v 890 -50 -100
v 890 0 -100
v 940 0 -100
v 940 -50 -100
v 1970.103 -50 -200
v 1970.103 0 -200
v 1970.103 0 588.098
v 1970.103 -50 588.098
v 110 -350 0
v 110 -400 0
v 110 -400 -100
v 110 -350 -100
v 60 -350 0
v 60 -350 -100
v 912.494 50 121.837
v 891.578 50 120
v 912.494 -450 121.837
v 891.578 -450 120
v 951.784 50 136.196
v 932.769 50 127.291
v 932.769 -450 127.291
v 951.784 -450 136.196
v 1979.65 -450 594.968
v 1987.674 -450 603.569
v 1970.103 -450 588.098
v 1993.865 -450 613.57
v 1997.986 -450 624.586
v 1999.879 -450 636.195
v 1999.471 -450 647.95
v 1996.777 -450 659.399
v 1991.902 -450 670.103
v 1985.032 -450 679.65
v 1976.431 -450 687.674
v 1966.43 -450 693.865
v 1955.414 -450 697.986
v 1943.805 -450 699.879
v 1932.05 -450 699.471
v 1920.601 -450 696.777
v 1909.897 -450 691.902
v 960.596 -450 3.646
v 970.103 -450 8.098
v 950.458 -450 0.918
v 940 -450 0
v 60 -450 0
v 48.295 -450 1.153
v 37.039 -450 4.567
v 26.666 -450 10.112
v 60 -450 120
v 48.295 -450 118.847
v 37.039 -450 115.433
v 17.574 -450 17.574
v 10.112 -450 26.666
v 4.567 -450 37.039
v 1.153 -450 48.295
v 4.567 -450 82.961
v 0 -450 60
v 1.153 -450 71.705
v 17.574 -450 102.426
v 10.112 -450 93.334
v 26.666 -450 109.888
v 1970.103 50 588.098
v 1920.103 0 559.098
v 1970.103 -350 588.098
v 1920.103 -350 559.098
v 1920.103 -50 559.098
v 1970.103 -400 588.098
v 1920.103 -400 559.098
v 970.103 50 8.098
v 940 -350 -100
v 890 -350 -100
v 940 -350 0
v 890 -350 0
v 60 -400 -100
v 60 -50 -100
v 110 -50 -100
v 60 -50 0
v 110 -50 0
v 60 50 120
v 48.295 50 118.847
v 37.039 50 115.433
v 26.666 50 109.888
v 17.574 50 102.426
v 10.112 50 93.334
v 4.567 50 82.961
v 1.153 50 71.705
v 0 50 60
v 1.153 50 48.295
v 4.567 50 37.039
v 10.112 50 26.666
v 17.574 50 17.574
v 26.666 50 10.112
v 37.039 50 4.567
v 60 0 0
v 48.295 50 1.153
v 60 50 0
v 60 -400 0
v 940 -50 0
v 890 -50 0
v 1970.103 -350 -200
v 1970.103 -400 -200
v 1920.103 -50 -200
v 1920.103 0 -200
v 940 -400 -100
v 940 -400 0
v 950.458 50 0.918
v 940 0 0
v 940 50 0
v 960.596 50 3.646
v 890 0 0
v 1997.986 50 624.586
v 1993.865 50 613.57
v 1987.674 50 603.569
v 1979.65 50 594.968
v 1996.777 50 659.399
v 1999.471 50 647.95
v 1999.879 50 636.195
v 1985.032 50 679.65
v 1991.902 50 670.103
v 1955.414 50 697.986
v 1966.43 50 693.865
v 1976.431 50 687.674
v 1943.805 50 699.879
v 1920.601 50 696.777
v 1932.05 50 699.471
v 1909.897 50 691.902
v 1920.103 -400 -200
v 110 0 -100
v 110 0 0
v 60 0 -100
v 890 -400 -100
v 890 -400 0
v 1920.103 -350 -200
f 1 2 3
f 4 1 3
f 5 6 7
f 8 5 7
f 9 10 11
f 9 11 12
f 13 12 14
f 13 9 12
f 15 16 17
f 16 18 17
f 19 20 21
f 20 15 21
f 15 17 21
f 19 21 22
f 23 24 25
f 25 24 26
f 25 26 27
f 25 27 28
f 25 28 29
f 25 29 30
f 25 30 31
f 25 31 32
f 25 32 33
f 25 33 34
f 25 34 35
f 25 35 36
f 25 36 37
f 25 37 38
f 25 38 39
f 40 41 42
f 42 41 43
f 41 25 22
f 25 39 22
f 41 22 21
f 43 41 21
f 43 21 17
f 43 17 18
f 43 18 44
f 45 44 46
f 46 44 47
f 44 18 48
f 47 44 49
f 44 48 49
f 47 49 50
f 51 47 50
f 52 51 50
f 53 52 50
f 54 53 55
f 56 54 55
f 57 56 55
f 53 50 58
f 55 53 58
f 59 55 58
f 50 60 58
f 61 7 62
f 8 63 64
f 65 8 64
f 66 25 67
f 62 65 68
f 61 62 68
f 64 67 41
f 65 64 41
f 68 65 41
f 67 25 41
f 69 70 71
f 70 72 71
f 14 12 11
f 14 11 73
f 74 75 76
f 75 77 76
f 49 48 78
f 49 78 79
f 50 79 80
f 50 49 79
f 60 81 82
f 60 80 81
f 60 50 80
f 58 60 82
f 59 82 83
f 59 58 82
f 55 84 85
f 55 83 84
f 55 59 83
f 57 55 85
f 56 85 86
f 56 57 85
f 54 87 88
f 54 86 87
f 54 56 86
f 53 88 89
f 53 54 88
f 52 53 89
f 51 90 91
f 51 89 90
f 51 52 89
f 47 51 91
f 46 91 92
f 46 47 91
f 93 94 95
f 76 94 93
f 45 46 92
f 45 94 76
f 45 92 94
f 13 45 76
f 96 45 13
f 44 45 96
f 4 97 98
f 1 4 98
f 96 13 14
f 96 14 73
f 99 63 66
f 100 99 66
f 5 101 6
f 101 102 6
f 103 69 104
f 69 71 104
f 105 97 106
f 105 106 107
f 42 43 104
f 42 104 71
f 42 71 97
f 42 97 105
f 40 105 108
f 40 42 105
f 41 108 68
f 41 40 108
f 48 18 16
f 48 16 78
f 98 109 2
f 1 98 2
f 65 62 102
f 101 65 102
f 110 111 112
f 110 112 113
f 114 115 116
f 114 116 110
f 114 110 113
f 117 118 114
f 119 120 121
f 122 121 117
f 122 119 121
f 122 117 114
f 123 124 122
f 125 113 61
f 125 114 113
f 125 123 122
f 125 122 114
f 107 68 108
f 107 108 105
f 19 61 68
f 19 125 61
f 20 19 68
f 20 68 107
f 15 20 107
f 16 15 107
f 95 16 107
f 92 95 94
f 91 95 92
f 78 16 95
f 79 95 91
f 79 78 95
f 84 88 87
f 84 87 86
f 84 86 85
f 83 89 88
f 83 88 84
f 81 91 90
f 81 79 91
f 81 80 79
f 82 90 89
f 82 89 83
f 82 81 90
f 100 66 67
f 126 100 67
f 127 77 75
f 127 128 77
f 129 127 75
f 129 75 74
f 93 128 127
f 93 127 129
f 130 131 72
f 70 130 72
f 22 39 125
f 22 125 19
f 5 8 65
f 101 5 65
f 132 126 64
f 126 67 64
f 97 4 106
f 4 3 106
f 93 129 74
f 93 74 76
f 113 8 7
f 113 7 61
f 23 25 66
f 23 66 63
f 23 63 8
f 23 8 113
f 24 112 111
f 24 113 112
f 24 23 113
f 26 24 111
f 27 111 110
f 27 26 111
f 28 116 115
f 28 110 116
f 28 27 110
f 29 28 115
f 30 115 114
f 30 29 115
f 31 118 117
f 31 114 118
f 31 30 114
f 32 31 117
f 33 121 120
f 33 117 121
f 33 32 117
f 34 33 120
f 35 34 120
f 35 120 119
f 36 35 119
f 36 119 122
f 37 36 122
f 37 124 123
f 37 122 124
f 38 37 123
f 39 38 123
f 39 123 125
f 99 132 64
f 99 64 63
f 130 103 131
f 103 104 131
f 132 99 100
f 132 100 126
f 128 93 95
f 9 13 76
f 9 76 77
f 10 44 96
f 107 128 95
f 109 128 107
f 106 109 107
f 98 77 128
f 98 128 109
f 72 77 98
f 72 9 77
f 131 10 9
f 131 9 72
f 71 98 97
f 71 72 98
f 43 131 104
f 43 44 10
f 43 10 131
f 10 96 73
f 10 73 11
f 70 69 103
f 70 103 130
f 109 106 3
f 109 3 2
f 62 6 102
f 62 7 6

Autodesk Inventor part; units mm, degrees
ref_plane "YZ Plane" through (0, 0, 0) normal (1, 0, 0) x (0, 1, 0)
ref_plane "XZ Plane" through (0, 0, 0) normal (0, 1, 0) x (-1, 0, 0)
ref_plane "XY Plane" through (0, 0, 0) normal (0, 0, 1) x (1, 0, 0)
sketch "Sketch1" plane through (0, 0, 0) normal (0, 1, 0) x (-1, 0, 0)
  line L0 (-60, 0) -> (-940, 0)
  line L1 (-891.5776, 120) -> (-60, 120)
  arc A0 (-60, 0) -> (-60, 120) centre (-60, 60) ccw
  line L2 (-60, 0) -> (-90, 0)
  arc A1 (-1909.8969, 691.9019) -> (-1970.1031, 588.0981) centre (-1940, 640) ccw
  line L3 (-1909.8969, 691.9019) -> (-951.7838, 136.1963)
  line L4 (-1970.1031, 588.0981) -> (-970.1031, 8.0981)
  arc A2 (-951.7838, 136.1963) -> (-891.5776, 120) centre (-891.5776, 240) ccw
  arc A3 (-970.1031, 8.0981) -> (-940, 0) centre (-940, 60) ccw
  line L5 (-60, 0) -> (-110, 0)
  line L6 (-110, 0) -> (-110, -100)
  line L7 (-110, -100) -> (-60, -100)
  line L8 (-60, -100) -> (-60, 0)
  line L9 (-940, 0) -> (-890, 0)
  line L10 (-890, 0) -> (-890, -100)
  line L11 (-890, -100) -> (-940, -100)
  line L12 (-940, -100) -> (-940, 0)
  line L13 (-1920.1031, 559.0981) -> (-1920.1031, -199.9999)
  line L14 (-1920.1031, -199.9999) -> (-1970.1031, -199.9999)
  line L15 (-1970.1031, -199.9999) -> (-1970.1031, 588.0981)
  point P0 (0, 0)
  dimension "d9" = 120
  dimension "d10" = 50
  dimension "d11" = 100
  dimension "d12" = 50
  dimension "d13" = 100
  dimension "d16" = 50
extrude "Extrusion1" add sketch "Sketch1" against normal blind 50 contours L8 L7 L6 L0 | L10 L11 L12 L0 | L4 L13 L14 L15
extrude "Extrusion2" add sketch "Sketch1" against normal blind 450 contours L0 A3 L4 A1 L3 A2 L1 A0
extrude "Extrusion3" add sketch "Sketch1" along normal blind 50 contours L0 A3 L4 A1 L3 A2 L1 A0
sketch "Sketch2" plane through (940, -450, 0) normal (0, 0, -1) x (-1, 0, 0)
  line L0 (880, 400) -> (880, 0) projected
  line L1 (880, 50) -> (830, 50)
  line L2 (830, 50) -> (830, 100)
  line L3 (830, 100) -> (880, 100)
  line L4 (880, 100) -> (880, 50)
  line L5 (0, 400) -> (0, 0) projected
  line L6 (0, 50) -> (50, 50)
  line L7 (50, 50) -> (50, 100)
  line L8 (50, 100) -> (0, 100)
  line L9 (0, 100) -> (0, 50)
  line L10 (-1030.1031, 50) -> (-980.1031, 50)
  line L11 (-980.1031, 50) -> (-980.1031, 100)
  line L12 (-980.1031, 100) -> (-1030.1031, 100)
  line L13 (-1030.1031, 100) -> (-1030.1031, 50)
  point P0 (940, 450)
  dimension "d24" = 50
  dimension "d25" = 50
  dimension "d26" = 50
  dimension "d27" = 50
  dimension "d28" = 50
  dimension "d29" = 50
extrude "Extrusion4" add sketch "Sketch2" along normal blind 100 contours L0 L1 L2 L3 | L8 L7 L6 L5
extrude "Extrusion5" add sketch "Sketch2" along normal blind 200 contours L13 L12 L11 L10
extrude "Extrusion6" add sketch "Sketch2" against normal blind 600 contours L13 L12 L11 L10
properties part number "FirstConveyor"
